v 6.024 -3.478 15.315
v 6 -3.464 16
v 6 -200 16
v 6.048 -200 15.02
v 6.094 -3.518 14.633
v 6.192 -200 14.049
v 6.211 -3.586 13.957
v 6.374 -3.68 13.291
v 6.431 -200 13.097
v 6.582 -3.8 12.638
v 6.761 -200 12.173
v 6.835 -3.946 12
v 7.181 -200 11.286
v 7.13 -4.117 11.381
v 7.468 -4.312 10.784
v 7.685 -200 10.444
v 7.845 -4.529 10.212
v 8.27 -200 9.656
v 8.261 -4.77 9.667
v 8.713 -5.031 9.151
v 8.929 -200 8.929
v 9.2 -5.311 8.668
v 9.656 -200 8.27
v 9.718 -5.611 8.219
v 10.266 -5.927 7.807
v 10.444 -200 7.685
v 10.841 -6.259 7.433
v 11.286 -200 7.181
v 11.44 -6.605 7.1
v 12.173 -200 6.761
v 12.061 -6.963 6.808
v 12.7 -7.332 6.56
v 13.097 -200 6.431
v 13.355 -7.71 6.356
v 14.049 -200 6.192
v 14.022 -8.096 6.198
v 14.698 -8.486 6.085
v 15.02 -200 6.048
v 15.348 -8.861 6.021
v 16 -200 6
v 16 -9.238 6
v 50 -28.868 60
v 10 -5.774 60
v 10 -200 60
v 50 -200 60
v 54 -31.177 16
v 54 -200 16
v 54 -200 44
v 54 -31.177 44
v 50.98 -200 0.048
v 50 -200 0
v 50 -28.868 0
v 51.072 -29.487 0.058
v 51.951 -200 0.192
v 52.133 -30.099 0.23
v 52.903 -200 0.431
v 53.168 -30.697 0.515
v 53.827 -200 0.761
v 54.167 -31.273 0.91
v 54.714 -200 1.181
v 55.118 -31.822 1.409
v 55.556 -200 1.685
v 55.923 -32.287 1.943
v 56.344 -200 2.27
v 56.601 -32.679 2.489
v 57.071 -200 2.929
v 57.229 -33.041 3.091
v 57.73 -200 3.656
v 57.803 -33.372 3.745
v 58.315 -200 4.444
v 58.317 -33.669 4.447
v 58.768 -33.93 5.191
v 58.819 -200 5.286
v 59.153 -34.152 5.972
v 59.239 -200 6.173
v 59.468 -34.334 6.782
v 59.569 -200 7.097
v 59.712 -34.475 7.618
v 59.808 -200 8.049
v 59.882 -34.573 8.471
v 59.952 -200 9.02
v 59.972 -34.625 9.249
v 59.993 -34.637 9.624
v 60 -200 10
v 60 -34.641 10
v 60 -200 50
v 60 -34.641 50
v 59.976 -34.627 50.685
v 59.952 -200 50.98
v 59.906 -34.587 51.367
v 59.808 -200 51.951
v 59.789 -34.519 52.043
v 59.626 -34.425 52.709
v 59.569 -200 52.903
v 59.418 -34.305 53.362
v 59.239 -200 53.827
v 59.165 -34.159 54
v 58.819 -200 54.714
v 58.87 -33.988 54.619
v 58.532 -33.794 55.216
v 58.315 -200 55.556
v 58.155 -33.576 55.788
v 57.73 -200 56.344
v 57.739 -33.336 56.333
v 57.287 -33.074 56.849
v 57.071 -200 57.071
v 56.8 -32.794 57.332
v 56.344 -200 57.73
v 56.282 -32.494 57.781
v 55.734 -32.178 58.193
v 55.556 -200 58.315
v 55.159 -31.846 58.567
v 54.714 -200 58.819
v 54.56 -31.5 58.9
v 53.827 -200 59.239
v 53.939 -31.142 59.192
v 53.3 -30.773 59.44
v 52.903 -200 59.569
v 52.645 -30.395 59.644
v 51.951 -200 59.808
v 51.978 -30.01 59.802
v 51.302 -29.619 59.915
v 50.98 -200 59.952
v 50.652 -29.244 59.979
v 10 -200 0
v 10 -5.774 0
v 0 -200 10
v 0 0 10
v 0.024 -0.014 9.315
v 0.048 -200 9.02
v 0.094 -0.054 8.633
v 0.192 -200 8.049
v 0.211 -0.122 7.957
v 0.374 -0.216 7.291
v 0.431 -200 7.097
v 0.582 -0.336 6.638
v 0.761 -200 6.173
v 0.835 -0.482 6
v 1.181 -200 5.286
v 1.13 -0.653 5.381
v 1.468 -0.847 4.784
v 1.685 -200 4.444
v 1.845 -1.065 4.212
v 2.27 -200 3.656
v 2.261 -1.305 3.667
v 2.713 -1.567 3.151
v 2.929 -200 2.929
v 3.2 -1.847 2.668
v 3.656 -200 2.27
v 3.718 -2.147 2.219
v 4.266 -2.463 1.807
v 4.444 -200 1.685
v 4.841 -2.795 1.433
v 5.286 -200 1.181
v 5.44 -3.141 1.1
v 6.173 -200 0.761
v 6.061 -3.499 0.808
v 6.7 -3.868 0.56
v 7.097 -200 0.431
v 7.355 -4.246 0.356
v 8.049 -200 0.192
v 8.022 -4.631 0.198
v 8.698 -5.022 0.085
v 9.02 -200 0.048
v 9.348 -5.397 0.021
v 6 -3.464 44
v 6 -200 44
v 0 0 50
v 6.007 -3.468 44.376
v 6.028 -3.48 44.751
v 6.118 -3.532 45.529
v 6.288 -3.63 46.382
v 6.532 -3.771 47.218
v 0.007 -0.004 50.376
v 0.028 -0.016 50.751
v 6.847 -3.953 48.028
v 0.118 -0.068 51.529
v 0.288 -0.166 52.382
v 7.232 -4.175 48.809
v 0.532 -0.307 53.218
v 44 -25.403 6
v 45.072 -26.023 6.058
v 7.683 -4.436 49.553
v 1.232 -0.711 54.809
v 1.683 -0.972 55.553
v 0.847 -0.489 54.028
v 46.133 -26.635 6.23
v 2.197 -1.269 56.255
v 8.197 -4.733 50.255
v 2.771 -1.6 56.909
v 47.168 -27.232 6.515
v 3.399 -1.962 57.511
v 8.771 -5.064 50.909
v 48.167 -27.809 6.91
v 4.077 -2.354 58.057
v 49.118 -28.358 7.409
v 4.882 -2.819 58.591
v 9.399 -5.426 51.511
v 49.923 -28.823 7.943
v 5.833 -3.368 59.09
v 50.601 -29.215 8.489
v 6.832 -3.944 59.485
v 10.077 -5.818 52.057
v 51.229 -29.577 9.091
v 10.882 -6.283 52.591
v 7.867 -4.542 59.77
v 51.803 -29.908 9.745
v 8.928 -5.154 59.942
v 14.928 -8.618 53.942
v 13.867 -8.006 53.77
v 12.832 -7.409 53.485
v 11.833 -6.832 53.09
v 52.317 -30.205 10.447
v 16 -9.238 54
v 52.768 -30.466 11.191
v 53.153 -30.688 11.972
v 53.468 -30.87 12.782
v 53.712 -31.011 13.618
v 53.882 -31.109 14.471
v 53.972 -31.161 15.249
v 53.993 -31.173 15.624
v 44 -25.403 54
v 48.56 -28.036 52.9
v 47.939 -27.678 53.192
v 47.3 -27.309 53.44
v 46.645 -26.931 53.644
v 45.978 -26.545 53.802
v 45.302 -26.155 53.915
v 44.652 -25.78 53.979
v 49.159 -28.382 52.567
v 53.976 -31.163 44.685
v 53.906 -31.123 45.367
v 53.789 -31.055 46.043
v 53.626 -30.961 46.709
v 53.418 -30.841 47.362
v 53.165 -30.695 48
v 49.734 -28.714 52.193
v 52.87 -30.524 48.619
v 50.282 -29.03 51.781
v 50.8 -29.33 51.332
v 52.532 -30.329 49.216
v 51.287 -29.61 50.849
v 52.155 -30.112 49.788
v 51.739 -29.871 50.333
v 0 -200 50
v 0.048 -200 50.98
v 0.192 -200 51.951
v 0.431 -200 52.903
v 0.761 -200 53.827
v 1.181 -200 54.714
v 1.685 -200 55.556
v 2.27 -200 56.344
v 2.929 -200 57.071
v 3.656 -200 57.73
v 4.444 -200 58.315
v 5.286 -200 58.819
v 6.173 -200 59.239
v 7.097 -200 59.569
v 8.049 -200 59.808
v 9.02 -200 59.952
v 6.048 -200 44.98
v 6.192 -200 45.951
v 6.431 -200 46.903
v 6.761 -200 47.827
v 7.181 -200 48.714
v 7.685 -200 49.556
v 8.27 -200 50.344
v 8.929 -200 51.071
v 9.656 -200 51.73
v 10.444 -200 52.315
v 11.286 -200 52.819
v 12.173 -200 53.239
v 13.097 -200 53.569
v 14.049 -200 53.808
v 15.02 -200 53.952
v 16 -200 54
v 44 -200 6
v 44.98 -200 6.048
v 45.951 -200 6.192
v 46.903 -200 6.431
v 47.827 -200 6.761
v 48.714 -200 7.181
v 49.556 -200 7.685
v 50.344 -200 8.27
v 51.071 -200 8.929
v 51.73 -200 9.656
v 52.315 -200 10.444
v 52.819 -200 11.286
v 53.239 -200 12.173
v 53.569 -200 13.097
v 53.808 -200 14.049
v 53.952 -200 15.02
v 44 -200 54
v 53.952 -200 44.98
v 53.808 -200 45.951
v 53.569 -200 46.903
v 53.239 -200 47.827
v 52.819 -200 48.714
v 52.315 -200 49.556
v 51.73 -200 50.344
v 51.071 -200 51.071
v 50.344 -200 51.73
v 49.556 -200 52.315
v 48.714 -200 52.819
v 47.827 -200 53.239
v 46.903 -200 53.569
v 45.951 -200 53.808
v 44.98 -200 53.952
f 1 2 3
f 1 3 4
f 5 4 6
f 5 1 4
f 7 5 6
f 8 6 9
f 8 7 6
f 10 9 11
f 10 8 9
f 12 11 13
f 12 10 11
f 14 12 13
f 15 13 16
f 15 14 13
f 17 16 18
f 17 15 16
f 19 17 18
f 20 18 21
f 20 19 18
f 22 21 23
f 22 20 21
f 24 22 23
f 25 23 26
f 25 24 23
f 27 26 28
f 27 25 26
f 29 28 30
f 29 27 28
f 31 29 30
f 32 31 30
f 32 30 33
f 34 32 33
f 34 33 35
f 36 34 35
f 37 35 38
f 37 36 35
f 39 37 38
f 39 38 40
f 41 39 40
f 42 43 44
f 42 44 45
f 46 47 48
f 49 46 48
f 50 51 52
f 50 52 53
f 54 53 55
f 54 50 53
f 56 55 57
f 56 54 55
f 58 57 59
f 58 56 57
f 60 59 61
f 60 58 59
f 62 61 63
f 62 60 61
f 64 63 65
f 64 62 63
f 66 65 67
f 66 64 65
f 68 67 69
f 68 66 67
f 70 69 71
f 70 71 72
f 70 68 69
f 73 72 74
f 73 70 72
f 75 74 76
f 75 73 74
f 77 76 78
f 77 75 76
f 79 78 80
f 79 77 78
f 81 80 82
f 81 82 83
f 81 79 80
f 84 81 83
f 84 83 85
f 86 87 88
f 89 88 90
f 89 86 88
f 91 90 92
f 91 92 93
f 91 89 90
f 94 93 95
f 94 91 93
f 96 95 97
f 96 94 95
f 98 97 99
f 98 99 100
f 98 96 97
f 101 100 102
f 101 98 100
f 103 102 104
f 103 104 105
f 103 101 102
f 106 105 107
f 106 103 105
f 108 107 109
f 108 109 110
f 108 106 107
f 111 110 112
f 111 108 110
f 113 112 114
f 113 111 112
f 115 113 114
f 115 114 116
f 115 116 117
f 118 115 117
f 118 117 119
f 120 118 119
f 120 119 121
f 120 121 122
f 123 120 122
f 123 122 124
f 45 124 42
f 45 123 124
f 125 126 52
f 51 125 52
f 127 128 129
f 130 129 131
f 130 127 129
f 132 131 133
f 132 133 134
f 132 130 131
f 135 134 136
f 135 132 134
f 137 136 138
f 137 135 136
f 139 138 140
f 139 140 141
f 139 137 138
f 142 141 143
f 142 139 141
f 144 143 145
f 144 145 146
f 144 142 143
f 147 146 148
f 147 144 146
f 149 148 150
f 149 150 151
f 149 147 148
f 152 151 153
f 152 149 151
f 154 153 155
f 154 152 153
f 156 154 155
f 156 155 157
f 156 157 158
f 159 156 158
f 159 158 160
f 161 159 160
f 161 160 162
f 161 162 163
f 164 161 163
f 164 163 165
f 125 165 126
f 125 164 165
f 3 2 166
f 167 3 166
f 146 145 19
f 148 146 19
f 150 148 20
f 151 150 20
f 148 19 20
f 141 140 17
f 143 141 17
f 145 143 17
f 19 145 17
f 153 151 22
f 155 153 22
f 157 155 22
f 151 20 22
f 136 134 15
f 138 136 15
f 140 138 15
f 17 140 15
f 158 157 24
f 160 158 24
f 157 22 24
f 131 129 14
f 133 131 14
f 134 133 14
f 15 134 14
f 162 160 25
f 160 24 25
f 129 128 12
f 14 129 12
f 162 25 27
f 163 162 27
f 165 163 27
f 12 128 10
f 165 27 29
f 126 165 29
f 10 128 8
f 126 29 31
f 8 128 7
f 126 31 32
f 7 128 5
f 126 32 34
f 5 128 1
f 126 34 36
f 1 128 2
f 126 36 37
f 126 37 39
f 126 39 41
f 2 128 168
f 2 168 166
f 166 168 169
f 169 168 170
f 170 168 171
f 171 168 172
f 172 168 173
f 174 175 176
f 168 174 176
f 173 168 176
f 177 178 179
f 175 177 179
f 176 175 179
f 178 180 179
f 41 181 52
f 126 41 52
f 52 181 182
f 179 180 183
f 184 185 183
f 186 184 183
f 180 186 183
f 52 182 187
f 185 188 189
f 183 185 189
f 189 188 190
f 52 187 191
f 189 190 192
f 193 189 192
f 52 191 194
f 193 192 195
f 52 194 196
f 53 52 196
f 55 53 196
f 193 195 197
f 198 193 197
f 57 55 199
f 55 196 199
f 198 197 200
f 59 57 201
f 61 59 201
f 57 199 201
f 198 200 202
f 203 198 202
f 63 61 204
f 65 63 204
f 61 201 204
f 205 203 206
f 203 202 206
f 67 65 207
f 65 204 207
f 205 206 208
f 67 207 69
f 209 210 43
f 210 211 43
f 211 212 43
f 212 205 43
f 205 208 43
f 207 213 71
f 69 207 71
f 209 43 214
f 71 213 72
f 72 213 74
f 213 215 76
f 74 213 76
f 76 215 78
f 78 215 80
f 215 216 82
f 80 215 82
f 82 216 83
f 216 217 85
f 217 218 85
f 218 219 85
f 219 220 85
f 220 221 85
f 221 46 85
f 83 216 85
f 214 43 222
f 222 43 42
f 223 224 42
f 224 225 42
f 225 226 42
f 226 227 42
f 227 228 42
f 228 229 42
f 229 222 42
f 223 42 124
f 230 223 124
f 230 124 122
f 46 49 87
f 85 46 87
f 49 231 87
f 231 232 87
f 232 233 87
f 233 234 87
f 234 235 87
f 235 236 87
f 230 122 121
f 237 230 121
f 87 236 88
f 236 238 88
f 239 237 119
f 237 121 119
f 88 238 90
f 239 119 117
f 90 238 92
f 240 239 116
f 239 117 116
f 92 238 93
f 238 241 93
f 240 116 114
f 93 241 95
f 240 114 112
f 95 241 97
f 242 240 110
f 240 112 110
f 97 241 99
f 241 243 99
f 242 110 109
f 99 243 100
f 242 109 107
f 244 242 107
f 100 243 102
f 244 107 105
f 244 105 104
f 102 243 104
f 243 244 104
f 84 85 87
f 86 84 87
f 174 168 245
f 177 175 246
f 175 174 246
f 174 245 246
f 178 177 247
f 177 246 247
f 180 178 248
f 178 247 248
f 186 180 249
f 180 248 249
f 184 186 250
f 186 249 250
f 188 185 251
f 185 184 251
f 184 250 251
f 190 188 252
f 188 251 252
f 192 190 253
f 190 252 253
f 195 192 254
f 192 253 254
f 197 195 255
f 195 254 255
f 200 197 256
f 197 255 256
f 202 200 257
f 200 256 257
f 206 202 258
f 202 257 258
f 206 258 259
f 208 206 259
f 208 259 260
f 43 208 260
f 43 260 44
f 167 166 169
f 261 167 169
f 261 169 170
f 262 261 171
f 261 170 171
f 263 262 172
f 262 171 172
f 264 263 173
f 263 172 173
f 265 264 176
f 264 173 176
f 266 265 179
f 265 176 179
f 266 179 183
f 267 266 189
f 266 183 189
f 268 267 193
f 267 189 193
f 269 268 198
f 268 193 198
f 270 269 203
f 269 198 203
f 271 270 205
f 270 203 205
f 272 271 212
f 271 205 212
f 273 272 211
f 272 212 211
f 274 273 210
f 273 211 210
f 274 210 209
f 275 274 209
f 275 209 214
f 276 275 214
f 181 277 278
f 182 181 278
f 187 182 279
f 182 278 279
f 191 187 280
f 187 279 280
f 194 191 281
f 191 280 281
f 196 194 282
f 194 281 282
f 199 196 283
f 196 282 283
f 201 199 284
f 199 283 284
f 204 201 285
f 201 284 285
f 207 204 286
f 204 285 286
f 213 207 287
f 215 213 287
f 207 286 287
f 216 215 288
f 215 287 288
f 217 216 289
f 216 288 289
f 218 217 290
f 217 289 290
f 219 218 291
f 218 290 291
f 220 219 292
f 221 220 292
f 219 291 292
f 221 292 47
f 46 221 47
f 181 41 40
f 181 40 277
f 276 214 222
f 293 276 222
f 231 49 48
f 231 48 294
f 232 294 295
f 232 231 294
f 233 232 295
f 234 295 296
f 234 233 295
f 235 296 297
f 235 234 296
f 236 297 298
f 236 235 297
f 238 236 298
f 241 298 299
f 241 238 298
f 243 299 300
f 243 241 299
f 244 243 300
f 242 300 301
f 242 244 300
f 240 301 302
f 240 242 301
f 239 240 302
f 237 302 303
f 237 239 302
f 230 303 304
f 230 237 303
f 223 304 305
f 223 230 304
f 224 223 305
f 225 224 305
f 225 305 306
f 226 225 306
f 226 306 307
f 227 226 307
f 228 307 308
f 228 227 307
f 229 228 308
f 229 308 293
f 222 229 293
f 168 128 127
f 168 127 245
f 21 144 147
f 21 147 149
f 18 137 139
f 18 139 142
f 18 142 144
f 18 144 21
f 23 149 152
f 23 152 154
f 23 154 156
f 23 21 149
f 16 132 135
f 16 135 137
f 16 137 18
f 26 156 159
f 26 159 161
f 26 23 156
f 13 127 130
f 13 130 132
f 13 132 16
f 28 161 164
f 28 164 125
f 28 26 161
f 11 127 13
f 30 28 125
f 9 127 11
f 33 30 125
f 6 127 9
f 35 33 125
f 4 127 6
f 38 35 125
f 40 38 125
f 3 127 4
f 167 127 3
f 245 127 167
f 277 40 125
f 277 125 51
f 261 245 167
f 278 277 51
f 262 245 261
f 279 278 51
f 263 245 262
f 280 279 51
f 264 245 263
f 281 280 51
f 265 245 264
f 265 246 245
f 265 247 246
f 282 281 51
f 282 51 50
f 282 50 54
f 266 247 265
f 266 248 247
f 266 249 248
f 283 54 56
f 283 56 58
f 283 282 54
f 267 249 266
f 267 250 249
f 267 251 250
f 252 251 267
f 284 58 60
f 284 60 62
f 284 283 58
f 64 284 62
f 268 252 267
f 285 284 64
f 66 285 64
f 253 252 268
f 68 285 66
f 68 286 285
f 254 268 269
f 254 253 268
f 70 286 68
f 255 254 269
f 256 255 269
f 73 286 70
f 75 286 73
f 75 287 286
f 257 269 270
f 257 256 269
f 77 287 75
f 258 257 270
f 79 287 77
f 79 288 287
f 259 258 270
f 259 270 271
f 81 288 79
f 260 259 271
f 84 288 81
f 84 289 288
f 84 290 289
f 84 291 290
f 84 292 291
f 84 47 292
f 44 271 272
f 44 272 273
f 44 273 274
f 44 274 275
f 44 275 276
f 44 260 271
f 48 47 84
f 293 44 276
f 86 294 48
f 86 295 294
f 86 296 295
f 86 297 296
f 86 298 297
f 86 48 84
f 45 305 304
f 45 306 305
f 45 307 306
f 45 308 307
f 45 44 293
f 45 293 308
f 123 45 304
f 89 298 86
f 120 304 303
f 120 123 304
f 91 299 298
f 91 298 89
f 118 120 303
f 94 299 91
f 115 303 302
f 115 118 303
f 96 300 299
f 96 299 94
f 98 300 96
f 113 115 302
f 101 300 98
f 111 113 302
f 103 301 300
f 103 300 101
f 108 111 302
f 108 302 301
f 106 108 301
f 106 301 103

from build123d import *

# Parameters (mm, degrees)
F0_W     = 60
F0_H     = 60
F1_DEPTH = 200
F2_T     = -6
F3_R     = 10
F5_DEPTH = 60.001


with BuildPart() as f1:
    # F0 (on Front) → F1 (new body)
    with BuildSketch(Plane.XZ):
        with Locations((30, 30)):
            Rectangle(F0_W, F0_H)
    extrude(amount=F1_DEPTH)

    # F2
    f2_openings = [f1.faces().sort_by_distance(p)[0] for p in [
        (30, -200, 30),
        (30, 0, 30),
    ]]
    offset(amount=F2_T, openings=f2_openings)

    # F3
    f3_edges = [f1.edges().sort_by_distance(p)[0] for p in [
        (60, -100, 60),
        (0, -100, 60),
        (60, -100, 0),
        (6, -100, 6),
        (0, -100, 0),
        (54, -100, 6),
        (54, -100, 54),
        (6, -100, 54),
    ]]
    fillet(f3_edges, radius=F3_R)

    # F4 (on face) → F5 (cut, through all)
    with BuildSketch(Plane.XY.offset(60)):
        Polygon((0, 0), (70, -40.4145188433), (70, 0), align=None)
    extrude(amount=-F5_DEPTH, mode=Mode.SUBTRACT)


solid = f1.part
